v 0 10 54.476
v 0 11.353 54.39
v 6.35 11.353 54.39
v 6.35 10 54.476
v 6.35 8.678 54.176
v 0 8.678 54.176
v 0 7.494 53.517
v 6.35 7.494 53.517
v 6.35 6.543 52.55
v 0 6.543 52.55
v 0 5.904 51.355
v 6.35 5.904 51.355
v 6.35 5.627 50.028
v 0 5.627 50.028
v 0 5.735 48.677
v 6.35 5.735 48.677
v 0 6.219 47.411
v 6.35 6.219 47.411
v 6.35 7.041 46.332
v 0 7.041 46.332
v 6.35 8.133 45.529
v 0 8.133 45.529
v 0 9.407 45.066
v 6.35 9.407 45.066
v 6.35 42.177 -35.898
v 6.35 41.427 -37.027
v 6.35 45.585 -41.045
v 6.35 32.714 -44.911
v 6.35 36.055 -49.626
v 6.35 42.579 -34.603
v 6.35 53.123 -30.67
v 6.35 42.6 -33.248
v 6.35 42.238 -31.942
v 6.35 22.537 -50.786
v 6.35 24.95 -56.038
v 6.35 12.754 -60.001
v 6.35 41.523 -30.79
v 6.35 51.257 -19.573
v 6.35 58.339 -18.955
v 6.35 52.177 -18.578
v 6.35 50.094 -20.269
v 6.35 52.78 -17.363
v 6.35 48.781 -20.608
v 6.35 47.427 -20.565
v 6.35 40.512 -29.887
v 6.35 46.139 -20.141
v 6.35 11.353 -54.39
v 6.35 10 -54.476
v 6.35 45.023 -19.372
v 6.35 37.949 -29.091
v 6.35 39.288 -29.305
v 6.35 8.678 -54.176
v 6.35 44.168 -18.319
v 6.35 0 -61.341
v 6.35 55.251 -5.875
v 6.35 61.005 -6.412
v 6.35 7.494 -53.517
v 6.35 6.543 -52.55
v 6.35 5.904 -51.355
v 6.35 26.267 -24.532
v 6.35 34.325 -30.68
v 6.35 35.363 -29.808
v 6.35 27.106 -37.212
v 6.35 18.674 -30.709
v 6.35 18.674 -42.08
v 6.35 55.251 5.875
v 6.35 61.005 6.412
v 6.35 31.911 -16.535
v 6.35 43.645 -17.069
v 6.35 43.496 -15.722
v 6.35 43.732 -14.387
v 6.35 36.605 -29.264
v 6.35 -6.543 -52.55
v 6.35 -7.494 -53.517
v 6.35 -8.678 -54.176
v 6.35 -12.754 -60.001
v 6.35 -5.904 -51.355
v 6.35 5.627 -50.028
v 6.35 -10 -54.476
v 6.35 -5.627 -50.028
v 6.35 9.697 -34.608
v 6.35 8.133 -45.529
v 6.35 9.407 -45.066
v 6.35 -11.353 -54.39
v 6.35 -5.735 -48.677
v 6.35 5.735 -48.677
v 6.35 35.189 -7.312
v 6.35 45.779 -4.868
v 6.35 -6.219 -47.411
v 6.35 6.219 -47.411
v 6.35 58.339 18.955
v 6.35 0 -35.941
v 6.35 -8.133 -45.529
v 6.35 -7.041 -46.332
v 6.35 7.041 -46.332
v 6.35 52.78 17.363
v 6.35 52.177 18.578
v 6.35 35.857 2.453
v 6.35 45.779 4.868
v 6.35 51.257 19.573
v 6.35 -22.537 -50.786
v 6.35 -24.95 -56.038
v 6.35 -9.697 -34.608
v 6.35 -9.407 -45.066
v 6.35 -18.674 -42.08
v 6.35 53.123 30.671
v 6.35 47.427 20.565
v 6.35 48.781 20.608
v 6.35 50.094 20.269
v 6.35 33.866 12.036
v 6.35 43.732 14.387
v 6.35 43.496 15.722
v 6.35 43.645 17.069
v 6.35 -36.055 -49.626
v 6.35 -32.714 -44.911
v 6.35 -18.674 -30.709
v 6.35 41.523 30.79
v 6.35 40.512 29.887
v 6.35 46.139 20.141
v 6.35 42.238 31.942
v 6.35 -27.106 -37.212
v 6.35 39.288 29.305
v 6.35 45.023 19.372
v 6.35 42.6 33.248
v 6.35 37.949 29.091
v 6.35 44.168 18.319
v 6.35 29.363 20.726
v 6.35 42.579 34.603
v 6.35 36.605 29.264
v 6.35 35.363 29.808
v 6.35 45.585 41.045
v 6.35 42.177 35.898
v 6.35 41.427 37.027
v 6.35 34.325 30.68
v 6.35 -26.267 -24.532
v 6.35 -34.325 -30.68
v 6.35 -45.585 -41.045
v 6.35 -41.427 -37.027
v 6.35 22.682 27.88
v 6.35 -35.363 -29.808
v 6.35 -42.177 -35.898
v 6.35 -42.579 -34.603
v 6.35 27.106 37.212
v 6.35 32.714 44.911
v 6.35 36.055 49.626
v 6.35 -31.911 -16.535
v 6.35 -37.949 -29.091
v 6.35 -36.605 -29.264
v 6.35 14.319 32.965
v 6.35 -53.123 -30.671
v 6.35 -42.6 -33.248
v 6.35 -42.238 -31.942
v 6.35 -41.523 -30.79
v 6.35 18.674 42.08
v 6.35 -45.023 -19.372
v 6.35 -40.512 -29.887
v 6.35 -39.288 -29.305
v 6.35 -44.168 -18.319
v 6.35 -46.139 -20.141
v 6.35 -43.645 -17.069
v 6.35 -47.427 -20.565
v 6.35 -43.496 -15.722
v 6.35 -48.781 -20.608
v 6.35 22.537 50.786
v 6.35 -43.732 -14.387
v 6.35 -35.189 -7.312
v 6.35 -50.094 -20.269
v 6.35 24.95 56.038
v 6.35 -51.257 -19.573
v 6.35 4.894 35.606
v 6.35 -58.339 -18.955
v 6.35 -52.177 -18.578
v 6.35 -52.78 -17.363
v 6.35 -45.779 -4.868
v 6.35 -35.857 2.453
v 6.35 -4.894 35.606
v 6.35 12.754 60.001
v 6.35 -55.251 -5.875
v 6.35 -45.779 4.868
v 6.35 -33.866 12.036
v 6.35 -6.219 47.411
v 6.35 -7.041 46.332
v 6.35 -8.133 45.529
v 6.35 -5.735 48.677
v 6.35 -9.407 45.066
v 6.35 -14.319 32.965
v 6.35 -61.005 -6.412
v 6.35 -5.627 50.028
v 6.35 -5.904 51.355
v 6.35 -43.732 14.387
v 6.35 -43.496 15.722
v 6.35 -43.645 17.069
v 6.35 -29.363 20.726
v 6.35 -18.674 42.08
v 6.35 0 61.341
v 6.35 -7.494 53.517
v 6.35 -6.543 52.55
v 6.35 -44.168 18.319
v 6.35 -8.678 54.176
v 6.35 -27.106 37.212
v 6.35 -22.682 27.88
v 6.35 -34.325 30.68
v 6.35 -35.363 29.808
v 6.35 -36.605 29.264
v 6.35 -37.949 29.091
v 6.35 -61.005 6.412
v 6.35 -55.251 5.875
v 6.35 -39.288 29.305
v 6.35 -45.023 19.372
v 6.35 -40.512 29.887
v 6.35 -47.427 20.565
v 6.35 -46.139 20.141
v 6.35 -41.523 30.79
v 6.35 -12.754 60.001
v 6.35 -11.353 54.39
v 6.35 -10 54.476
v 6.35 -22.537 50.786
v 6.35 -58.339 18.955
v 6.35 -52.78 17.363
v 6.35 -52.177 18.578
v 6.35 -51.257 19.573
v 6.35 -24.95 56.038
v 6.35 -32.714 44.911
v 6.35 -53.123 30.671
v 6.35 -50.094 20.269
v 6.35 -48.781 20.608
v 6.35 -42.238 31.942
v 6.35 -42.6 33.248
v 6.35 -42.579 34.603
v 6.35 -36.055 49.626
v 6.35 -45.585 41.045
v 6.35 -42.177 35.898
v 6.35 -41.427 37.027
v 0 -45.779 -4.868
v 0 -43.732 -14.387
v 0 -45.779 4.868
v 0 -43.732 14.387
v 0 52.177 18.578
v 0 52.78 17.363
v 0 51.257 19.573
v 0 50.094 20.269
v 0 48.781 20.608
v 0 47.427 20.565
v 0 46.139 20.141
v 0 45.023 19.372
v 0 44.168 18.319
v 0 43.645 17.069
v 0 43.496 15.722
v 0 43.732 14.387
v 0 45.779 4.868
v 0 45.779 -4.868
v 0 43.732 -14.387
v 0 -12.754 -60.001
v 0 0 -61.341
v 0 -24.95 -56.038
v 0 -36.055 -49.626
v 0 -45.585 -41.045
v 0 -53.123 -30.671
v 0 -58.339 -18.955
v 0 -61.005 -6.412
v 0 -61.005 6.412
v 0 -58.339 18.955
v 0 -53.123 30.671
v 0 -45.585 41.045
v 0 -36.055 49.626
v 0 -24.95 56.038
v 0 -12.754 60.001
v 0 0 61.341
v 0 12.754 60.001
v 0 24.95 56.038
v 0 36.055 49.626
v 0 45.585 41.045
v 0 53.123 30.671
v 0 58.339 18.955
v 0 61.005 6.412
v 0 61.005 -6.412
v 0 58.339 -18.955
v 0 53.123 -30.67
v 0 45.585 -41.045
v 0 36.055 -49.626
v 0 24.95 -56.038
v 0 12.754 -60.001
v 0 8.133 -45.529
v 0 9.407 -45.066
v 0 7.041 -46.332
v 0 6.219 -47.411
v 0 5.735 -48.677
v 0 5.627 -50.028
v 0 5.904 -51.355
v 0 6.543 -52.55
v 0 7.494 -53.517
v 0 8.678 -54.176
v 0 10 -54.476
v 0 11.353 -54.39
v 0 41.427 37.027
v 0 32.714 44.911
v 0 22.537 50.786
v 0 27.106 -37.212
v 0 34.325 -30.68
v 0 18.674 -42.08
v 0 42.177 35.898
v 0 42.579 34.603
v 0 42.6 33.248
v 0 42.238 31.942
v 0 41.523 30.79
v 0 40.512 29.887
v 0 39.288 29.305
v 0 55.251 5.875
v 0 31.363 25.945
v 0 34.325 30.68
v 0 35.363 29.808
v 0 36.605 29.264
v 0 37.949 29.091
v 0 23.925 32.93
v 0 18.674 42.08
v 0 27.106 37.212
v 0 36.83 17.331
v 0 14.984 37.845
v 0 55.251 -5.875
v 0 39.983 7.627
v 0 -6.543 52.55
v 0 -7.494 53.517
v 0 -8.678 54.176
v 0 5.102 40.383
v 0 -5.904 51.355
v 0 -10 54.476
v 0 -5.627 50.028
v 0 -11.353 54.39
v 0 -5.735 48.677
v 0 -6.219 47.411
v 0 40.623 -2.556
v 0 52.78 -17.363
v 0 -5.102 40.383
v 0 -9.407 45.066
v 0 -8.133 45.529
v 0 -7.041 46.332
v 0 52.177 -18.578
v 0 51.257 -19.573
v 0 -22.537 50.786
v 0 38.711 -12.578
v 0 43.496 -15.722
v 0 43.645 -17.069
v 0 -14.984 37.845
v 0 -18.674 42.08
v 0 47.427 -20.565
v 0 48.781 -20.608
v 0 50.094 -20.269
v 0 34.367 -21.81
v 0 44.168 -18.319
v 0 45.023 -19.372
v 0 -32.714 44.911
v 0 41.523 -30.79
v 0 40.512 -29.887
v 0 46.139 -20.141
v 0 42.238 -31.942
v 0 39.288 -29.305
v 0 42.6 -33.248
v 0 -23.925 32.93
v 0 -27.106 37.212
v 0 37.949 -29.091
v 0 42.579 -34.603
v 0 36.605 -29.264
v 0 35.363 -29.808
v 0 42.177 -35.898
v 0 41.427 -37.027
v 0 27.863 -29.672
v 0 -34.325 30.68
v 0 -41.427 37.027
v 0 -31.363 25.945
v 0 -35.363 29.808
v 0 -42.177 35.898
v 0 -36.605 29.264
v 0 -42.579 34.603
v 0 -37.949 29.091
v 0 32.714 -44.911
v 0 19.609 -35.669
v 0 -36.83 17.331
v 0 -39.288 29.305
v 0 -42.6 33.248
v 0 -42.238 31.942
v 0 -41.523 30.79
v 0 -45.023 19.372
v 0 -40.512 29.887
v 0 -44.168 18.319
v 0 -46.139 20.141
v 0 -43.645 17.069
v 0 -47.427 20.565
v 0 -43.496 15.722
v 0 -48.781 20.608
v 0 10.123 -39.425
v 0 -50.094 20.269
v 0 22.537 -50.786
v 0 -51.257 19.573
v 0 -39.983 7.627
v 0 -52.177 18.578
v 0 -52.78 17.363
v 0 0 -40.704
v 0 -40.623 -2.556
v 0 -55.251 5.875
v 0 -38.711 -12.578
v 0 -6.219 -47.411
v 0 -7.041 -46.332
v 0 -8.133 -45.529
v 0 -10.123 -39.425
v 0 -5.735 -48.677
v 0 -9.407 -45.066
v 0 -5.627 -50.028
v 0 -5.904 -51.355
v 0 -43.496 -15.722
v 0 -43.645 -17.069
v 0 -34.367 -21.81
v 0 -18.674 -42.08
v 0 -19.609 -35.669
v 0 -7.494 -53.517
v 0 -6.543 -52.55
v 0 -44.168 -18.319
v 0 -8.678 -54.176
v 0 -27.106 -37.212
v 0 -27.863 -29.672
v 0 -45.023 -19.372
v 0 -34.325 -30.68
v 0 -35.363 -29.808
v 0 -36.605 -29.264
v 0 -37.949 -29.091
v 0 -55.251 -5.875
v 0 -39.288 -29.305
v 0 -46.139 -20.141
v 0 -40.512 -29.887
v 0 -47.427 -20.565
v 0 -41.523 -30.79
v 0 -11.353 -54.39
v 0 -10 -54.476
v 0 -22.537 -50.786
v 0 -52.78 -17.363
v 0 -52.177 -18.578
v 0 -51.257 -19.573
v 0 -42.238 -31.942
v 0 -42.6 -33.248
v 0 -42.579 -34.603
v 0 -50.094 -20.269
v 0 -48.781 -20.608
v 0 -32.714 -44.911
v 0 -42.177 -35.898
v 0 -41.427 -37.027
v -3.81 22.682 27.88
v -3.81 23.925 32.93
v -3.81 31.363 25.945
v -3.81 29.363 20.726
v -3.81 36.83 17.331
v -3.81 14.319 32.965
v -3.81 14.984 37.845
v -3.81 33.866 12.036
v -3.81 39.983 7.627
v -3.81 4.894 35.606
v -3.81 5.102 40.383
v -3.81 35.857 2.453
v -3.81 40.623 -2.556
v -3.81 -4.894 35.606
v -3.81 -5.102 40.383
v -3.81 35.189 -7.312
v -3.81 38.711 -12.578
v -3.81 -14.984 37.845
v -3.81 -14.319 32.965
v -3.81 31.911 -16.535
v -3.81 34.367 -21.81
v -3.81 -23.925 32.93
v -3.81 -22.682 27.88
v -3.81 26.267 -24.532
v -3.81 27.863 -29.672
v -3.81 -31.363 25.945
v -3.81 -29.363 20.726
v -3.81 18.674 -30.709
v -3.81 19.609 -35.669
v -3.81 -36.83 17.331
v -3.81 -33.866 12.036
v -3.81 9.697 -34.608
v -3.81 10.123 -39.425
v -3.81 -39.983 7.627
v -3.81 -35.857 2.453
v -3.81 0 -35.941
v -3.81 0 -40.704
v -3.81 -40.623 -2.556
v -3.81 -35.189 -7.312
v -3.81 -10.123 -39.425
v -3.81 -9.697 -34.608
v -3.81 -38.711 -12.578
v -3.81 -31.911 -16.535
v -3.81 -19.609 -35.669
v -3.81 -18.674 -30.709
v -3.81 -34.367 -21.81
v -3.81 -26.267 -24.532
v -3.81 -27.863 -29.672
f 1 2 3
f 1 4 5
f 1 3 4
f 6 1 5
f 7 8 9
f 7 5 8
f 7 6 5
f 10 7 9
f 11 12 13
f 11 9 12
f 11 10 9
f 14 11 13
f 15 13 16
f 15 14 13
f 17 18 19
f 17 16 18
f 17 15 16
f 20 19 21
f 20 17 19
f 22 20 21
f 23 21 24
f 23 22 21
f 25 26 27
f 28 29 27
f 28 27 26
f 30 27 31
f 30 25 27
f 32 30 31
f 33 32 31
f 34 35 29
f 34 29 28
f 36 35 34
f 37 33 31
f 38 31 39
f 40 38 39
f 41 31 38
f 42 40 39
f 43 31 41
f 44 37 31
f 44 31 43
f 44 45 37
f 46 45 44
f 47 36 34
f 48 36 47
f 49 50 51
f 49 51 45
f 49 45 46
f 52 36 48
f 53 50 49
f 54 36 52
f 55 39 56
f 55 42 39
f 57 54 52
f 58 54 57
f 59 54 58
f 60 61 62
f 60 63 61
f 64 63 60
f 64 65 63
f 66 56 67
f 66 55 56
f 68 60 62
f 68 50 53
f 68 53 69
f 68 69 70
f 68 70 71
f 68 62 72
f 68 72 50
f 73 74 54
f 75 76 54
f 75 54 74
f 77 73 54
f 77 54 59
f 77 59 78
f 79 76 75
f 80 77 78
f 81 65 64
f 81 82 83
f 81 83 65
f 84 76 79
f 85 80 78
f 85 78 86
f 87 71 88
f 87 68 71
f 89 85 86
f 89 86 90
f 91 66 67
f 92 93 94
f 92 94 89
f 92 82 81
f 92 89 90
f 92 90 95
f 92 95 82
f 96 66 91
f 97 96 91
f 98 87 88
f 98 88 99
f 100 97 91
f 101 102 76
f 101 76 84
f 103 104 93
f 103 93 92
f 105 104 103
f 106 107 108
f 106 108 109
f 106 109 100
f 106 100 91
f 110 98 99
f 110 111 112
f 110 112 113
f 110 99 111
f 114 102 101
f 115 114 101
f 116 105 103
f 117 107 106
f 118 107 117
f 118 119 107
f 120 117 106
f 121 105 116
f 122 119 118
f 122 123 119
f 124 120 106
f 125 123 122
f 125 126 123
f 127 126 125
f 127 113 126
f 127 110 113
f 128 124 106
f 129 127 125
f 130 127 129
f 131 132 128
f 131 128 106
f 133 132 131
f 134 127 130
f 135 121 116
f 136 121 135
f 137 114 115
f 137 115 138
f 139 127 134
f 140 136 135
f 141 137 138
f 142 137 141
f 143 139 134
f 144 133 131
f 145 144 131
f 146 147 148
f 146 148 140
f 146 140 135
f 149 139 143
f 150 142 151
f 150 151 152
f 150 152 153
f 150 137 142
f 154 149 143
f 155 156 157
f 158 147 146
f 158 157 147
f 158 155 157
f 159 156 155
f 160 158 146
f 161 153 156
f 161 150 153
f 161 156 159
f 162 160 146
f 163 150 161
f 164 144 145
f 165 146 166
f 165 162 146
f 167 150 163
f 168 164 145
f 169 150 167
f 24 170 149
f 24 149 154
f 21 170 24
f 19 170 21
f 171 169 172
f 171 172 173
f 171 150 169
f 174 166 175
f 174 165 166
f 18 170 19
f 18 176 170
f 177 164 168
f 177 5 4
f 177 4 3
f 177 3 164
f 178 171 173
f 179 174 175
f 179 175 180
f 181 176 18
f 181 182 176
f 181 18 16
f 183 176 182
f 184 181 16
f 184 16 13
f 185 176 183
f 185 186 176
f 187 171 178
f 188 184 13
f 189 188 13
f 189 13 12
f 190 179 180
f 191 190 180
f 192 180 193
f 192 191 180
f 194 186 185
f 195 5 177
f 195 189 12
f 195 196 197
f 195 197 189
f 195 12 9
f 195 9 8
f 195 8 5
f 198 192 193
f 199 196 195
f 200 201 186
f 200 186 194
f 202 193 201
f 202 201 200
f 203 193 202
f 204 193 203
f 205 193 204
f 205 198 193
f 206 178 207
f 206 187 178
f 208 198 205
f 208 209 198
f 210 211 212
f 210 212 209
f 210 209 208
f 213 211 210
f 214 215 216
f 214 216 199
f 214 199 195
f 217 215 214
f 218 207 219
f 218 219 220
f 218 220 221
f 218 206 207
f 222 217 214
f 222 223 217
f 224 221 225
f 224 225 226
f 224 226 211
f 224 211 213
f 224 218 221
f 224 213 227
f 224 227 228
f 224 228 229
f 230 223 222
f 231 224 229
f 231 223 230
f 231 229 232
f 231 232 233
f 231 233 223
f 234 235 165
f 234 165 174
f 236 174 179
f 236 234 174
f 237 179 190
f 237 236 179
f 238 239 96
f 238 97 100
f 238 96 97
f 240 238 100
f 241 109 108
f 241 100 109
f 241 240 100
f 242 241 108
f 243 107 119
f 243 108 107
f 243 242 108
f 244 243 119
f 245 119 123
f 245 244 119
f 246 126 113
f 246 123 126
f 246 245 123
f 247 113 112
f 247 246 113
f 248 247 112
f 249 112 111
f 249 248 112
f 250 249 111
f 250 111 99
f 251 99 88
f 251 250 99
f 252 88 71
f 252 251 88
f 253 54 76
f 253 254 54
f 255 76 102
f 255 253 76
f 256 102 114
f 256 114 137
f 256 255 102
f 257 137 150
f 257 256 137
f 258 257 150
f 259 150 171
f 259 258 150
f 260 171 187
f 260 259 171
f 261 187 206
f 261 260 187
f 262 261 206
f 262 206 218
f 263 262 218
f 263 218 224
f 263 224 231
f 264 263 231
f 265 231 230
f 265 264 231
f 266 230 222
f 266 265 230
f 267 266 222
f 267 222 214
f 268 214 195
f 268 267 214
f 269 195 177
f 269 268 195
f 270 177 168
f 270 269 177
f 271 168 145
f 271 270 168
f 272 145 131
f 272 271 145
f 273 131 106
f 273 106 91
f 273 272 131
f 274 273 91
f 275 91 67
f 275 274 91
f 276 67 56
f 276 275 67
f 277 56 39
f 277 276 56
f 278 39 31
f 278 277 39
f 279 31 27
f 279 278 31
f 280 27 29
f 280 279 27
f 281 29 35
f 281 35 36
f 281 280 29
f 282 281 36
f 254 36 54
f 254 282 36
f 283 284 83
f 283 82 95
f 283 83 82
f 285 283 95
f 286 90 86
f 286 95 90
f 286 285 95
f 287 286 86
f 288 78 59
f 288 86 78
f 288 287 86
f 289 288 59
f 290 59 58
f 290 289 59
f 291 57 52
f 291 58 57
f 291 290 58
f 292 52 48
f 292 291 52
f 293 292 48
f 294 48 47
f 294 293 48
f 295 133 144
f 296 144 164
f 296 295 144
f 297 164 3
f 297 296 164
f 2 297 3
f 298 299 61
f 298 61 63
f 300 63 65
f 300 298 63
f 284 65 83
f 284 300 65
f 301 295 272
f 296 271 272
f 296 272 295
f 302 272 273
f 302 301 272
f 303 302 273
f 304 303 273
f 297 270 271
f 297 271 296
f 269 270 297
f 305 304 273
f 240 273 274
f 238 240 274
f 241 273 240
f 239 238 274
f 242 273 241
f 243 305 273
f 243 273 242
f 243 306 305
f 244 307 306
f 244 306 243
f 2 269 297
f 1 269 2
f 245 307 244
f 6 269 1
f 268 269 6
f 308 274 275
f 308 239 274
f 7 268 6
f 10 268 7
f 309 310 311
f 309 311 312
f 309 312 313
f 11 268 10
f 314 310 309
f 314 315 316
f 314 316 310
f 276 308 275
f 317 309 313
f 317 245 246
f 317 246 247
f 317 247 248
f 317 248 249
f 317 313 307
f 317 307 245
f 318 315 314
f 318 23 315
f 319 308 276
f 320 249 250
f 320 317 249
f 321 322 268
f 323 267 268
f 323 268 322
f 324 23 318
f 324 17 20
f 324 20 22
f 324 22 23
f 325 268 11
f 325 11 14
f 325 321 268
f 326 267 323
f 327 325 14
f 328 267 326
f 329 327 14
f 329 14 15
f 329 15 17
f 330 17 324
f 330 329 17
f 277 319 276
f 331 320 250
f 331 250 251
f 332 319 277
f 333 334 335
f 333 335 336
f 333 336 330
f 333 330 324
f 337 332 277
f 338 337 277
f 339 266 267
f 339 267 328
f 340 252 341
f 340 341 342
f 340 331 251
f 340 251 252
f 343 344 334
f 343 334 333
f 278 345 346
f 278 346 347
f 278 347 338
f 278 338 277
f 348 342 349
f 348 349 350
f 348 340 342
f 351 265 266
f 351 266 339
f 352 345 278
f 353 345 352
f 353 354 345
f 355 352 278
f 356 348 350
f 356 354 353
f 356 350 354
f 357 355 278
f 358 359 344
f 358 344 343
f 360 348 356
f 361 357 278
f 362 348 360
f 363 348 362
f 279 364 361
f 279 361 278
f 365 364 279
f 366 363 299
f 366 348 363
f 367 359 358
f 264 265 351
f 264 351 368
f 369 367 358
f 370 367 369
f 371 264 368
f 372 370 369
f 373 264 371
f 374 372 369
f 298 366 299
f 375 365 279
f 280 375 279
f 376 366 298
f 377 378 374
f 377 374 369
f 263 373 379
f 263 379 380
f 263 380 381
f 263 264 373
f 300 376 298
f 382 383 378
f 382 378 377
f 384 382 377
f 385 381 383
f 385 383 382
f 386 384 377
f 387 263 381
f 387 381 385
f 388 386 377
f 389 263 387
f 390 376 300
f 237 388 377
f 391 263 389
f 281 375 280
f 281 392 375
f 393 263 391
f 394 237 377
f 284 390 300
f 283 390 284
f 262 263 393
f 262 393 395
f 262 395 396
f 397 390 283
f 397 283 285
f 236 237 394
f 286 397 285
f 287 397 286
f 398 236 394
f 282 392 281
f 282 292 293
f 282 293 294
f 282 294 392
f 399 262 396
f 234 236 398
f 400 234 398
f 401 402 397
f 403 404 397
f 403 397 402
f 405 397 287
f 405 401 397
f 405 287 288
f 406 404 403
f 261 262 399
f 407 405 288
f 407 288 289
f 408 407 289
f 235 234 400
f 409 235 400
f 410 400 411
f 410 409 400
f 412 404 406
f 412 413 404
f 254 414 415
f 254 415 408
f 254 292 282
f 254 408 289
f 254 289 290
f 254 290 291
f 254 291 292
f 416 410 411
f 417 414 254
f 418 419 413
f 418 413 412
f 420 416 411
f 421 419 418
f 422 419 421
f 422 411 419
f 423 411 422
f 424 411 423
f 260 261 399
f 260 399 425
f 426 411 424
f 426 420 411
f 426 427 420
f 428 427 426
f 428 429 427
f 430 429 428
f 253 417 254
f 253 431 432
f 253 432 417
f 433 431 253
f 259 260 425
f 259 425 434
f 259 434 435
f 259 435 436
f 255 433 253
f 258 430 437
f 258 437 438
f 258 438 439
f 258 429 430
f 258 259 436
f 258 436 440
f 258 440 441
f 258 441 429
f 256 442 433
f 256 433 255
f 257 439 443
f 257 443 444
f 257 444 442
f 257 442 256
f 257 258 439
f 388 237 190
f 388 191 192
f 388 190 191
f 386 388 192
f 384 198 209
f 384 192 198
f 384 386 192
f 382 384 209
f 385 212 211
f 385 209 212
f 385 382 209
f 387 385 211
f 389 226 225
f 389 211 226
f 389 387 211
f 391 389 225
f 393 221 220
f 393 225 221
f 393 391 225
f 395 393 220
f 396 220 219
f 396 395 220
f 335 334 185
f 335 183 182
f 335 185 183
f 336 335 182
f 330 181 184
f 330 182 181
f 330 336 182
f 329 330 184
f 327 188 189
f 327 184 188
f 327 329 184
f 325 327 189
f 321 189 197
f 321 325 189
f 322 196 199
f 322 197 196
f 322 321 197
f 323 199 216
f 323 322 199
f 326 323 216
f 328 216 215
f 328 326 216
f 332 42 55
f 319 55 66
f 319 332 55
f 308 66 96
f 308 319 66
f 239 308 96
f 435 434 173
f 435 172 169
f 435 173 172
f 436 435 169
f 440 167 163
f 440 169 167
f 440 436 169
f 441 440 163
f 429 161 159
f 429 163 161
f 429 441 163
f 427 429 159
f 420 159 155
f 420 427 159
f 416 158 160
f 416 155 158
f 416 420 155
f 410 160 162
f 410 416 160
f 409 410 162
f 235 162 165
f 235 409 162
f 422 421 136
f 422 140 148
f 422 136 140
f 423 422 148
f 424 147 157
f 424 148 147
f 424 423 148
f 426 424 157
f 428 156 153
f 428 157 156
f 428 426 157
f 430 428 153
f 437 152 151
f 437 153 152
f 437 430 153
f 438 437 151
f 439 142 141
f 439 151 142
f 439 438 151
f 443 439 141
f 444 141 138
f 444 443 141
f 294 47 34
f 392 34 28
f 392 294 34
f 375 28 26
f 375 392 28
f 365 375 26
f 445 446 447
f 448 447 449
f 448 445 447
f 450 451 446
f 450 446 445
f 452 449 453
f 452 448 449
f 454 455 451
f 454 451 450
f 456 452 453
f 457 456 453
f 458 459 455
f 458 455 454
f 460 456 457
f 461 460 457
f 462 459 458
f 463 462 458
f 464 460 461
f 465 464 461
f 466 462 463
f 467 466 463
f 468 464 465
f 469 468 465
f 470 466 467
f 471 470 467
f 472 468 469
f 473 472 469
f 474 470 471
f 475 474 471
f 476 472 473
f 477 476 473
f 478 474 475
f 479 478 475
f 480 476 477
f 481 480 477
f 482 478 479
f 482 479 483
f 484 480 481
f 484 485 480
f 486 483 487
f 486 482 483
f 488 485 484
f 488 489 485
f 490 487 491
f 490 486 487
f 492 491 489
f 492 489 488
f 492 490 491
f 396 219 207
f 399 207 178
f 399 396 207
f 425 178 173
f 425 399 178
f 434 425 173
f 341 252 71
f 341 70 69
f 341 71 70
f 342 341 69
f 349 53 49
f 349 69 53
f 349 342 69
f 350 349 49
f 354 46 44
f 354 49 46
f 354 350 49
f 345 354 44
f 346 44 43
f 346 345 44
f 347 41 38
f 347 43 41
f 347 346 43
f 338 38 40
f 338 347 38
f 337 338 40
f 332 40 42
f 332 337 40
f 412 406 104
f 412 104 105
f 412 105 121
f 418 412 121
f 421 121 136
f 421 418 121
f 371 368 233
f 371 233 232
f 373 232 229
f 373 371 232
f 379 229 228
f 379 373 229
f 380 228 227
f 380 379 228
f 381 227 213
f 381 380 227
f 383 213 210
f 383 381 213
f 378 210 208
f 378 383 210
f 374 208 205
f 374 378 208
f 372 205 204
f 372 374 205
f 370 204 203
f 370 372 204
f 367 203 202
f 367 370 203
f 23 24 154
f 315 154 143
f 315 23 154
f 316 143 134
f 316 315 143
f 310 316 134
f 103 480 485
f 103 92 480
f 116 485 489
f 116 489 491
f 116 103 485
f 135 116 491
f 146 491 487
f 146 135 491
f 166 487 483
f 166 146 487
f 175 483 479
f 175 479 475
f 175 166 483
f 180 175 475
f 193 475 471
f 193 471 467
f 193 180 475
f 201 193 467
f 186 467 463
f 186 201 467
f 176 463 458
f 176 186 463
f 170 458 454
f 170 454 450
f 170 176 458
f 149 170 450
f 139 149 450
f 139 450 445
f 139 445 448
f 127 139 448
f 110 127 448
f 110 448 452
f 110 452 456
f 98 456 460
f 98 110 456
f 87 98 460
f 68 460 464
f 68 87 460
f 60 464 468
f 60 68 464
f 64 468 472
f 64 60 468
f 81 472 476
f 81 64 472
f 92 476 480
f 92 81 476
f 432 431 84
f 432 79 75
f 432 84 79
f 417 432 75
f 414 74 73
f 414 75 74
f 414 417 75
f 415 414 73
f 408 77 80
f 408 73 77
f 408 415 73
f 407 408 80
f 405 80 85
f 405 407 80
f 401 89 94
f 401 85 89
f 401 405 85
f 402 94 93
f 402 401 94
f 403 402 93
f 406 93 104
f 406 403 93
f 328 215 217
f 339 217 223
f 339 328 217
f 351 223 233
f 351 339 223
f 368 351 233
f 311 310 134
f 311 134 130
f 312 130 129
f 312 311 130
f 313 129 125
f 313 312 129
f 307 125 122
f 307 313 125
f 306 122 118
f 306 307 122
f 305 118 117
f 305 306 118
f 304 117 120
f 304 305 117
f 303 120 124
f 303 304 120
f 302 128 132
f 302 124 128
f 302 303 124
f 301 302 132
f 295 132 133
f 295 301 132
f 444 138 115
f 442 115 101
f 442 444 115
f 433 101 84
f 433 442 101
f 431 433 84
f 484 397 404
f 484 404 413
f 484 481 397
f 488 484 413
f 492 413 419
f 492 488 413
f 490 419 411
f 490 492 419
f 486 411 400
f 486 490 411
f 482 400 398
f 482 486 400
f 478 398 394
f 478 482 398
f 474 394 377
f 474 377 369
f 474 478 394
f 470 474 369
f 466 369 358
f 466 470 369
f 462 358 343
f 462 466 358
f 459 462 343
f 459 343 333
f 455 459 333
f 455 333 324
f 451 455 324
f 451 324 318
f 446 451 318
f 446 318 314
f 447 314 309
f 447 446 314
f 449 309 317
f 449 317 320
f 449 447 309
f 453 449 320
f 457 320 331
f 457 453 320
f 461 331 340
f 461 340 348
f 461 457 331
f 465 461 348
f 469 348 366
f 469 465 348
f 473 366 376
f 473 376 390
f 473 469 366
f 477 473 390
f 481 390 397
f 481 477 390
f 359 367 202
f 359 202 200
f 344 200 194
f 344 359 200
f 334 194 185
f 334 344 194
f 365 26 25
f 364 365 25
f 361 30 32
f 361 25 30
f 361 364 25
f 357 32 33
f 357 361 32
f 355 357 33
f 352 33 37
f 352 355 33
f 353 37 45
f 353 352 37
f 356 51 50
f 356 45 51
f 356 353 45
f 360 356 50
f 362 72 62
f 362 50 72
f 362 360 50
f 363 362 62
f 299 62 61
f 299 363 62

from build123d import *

# Parameters (mm, degrees)
CUT_EXTRUDE1_DEPTH = 87.981371925
CIRPATTERN1_COUNT  = 6


with BuildPart() as part:
    # Sketch2 → Revolve1 (revolve)
    with BuildSketch(Plane.XY, mode=Mode.PRIVATE) as revolve1_sk:
        Polygon((0, 35.941), (6.35, 35.941), (6.35, 61.341), (0, 61.341), (0, 40.7035), (-3.81, 40.7035), (-3.81, 35.941), align=None)
    revolve(revolve1_sk.sketch.rotate(Axis((88.99, 0, 0), (-1, 0, 0)), 90), axis=Axis((88.99, 0, 0), (-1, 0, 0)))

    # Sketch3 → Cut-Extrude1 (cut, through all)
    with BuildSketch(Plane(origin=(0, 0, 0), x_dir=(0, 0, -1), z_dir=(1, 0, 0))):
        with BuildLine():
            ThreePointArc((17.36328125, 52.779805518), (0, 55.5625), (-17.36328125, 52.779805518))
            ThreePointArc((-17.36328125, 52.779805518), (-20.39898333, 46.767540938), (-14.38671875, 43.731838858))
            ThreePointArc((-14.38671875, 43.731838858), (0, 46.0375), (14.38671875, 43.731838858))
            ThreePointArc((14.38671875, 43.731838858), (20.39898333, 46.767540938), (17.36328125, 52.779805518))
        make_face()
    cut_extrude1 = extrude(amount=CUT_EXTRUDE1_DEPTH, mode=Mode.SUBTRACT)

    # CirPattern1: Cut-Extrude1 ×6 about axis
    cirpattern1_axis = Axis((0, 0, 0), (1, 0, 0))
    for i in range(1, CIRPATTERN1_COUNT):
        add(cut_extrude1.rotate(cirpattern1_axis, i * 360 / CIRPATTERN1_COUNT), mode=Mode.SUBTRACT)


solid = part.part
